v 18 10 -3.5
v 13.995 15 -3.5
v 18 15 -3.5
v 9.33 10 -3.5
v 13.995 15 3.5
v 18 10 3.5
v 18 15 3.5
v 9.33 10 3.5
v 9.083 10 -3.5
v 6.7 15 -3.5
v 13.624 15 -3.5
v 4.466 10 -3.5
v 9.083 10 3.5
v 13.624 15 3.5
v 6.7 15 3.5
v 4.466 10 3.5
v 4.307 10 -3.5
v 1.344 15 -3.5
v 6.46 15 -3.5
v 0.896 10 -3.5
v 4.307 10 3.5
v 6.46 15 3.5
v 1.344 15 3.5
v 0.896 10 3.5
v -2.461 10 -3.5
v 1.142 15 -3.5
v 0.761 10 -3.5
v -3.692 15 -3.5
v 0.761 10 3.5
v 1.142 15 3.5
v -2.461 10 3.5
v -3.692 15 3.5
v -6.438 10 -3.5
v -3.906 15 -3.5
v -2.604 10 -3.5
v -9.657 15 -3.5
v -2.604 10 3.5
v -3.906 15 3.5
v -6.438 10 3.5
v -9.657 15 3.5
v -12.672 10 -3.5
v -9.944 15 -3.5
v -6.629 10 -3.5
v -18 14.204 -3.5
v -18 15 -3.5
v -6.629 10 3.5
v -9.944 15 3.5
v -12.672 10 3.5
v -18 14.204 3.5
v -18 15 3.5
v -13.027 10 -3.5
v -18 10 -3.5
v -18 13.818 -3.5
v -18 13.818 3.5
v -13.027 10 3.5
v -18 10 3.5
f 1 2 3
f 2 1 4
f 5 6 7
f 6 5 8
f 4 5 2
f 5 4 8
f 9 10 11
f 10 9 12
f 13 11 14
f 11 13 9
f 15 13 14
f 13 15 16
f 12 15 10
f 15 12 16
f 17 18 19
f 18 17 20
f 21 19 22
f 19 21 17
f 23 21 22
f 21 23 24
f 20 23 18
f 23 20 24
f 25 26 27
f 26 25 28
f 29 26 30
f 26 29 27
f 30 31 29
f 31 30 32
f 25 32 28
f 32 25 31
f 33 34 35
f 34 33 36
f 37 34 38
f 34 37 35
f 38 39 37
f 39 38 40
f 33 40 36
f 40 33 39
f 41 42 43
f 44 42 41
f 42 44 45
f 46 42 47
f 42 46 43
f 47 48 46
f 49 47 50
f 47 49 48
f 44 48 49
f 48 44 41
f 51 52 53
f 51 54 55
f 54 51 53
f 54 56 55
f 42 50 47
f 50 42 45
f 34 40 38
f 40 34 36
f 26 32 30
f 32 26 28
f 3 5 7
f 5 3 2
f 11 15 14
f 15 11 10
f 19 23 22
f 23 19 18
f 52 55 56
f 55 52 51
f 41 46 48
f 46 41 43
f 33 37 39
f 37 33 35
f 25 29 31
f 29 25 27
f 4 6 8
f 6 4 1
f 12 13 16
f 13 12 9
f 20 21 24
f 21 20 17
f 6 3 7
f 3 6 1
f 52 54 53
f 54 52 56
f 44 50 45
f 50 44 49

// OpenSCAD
// Nicolì Angelo 2024 - THIS CODE IS LICENSED AS GPL-2.0

module Arc_02(){

    module Arc_01(){
   
        color("#a8b0b2")
        
        for (i=[0:45:359]) {
            r = 10; // pattern radius
            n = 19; // number of cars
            step = 360/n;
            for (i=[0:step:359]) {
                angle = i;
                dx = r*cos(angle);
                dy = r*sin(angle);
                //translate([dx,dy,0])
                rotate([0,0,angle])  
                {
                linear_extrude(7, scale = 1, center = true)
                polygon(points=[[0,0],[25,-4],[25,4]]);          
                }    
            }
        }
    }
    
    color("#f2e8d7"){
        difference(){
            Arc_01();
            translate([0,40,0])
            cube([50,50,100], center = true);
            translate([0,-15,0])
            cube([60,50,100], center = true);
            translate([48,0,0])
            cube([60,50,100], center = true);
            translate([-48,0,0])
            cube([60,50,100], center = true);
        }
    }

}

Arc_02();
